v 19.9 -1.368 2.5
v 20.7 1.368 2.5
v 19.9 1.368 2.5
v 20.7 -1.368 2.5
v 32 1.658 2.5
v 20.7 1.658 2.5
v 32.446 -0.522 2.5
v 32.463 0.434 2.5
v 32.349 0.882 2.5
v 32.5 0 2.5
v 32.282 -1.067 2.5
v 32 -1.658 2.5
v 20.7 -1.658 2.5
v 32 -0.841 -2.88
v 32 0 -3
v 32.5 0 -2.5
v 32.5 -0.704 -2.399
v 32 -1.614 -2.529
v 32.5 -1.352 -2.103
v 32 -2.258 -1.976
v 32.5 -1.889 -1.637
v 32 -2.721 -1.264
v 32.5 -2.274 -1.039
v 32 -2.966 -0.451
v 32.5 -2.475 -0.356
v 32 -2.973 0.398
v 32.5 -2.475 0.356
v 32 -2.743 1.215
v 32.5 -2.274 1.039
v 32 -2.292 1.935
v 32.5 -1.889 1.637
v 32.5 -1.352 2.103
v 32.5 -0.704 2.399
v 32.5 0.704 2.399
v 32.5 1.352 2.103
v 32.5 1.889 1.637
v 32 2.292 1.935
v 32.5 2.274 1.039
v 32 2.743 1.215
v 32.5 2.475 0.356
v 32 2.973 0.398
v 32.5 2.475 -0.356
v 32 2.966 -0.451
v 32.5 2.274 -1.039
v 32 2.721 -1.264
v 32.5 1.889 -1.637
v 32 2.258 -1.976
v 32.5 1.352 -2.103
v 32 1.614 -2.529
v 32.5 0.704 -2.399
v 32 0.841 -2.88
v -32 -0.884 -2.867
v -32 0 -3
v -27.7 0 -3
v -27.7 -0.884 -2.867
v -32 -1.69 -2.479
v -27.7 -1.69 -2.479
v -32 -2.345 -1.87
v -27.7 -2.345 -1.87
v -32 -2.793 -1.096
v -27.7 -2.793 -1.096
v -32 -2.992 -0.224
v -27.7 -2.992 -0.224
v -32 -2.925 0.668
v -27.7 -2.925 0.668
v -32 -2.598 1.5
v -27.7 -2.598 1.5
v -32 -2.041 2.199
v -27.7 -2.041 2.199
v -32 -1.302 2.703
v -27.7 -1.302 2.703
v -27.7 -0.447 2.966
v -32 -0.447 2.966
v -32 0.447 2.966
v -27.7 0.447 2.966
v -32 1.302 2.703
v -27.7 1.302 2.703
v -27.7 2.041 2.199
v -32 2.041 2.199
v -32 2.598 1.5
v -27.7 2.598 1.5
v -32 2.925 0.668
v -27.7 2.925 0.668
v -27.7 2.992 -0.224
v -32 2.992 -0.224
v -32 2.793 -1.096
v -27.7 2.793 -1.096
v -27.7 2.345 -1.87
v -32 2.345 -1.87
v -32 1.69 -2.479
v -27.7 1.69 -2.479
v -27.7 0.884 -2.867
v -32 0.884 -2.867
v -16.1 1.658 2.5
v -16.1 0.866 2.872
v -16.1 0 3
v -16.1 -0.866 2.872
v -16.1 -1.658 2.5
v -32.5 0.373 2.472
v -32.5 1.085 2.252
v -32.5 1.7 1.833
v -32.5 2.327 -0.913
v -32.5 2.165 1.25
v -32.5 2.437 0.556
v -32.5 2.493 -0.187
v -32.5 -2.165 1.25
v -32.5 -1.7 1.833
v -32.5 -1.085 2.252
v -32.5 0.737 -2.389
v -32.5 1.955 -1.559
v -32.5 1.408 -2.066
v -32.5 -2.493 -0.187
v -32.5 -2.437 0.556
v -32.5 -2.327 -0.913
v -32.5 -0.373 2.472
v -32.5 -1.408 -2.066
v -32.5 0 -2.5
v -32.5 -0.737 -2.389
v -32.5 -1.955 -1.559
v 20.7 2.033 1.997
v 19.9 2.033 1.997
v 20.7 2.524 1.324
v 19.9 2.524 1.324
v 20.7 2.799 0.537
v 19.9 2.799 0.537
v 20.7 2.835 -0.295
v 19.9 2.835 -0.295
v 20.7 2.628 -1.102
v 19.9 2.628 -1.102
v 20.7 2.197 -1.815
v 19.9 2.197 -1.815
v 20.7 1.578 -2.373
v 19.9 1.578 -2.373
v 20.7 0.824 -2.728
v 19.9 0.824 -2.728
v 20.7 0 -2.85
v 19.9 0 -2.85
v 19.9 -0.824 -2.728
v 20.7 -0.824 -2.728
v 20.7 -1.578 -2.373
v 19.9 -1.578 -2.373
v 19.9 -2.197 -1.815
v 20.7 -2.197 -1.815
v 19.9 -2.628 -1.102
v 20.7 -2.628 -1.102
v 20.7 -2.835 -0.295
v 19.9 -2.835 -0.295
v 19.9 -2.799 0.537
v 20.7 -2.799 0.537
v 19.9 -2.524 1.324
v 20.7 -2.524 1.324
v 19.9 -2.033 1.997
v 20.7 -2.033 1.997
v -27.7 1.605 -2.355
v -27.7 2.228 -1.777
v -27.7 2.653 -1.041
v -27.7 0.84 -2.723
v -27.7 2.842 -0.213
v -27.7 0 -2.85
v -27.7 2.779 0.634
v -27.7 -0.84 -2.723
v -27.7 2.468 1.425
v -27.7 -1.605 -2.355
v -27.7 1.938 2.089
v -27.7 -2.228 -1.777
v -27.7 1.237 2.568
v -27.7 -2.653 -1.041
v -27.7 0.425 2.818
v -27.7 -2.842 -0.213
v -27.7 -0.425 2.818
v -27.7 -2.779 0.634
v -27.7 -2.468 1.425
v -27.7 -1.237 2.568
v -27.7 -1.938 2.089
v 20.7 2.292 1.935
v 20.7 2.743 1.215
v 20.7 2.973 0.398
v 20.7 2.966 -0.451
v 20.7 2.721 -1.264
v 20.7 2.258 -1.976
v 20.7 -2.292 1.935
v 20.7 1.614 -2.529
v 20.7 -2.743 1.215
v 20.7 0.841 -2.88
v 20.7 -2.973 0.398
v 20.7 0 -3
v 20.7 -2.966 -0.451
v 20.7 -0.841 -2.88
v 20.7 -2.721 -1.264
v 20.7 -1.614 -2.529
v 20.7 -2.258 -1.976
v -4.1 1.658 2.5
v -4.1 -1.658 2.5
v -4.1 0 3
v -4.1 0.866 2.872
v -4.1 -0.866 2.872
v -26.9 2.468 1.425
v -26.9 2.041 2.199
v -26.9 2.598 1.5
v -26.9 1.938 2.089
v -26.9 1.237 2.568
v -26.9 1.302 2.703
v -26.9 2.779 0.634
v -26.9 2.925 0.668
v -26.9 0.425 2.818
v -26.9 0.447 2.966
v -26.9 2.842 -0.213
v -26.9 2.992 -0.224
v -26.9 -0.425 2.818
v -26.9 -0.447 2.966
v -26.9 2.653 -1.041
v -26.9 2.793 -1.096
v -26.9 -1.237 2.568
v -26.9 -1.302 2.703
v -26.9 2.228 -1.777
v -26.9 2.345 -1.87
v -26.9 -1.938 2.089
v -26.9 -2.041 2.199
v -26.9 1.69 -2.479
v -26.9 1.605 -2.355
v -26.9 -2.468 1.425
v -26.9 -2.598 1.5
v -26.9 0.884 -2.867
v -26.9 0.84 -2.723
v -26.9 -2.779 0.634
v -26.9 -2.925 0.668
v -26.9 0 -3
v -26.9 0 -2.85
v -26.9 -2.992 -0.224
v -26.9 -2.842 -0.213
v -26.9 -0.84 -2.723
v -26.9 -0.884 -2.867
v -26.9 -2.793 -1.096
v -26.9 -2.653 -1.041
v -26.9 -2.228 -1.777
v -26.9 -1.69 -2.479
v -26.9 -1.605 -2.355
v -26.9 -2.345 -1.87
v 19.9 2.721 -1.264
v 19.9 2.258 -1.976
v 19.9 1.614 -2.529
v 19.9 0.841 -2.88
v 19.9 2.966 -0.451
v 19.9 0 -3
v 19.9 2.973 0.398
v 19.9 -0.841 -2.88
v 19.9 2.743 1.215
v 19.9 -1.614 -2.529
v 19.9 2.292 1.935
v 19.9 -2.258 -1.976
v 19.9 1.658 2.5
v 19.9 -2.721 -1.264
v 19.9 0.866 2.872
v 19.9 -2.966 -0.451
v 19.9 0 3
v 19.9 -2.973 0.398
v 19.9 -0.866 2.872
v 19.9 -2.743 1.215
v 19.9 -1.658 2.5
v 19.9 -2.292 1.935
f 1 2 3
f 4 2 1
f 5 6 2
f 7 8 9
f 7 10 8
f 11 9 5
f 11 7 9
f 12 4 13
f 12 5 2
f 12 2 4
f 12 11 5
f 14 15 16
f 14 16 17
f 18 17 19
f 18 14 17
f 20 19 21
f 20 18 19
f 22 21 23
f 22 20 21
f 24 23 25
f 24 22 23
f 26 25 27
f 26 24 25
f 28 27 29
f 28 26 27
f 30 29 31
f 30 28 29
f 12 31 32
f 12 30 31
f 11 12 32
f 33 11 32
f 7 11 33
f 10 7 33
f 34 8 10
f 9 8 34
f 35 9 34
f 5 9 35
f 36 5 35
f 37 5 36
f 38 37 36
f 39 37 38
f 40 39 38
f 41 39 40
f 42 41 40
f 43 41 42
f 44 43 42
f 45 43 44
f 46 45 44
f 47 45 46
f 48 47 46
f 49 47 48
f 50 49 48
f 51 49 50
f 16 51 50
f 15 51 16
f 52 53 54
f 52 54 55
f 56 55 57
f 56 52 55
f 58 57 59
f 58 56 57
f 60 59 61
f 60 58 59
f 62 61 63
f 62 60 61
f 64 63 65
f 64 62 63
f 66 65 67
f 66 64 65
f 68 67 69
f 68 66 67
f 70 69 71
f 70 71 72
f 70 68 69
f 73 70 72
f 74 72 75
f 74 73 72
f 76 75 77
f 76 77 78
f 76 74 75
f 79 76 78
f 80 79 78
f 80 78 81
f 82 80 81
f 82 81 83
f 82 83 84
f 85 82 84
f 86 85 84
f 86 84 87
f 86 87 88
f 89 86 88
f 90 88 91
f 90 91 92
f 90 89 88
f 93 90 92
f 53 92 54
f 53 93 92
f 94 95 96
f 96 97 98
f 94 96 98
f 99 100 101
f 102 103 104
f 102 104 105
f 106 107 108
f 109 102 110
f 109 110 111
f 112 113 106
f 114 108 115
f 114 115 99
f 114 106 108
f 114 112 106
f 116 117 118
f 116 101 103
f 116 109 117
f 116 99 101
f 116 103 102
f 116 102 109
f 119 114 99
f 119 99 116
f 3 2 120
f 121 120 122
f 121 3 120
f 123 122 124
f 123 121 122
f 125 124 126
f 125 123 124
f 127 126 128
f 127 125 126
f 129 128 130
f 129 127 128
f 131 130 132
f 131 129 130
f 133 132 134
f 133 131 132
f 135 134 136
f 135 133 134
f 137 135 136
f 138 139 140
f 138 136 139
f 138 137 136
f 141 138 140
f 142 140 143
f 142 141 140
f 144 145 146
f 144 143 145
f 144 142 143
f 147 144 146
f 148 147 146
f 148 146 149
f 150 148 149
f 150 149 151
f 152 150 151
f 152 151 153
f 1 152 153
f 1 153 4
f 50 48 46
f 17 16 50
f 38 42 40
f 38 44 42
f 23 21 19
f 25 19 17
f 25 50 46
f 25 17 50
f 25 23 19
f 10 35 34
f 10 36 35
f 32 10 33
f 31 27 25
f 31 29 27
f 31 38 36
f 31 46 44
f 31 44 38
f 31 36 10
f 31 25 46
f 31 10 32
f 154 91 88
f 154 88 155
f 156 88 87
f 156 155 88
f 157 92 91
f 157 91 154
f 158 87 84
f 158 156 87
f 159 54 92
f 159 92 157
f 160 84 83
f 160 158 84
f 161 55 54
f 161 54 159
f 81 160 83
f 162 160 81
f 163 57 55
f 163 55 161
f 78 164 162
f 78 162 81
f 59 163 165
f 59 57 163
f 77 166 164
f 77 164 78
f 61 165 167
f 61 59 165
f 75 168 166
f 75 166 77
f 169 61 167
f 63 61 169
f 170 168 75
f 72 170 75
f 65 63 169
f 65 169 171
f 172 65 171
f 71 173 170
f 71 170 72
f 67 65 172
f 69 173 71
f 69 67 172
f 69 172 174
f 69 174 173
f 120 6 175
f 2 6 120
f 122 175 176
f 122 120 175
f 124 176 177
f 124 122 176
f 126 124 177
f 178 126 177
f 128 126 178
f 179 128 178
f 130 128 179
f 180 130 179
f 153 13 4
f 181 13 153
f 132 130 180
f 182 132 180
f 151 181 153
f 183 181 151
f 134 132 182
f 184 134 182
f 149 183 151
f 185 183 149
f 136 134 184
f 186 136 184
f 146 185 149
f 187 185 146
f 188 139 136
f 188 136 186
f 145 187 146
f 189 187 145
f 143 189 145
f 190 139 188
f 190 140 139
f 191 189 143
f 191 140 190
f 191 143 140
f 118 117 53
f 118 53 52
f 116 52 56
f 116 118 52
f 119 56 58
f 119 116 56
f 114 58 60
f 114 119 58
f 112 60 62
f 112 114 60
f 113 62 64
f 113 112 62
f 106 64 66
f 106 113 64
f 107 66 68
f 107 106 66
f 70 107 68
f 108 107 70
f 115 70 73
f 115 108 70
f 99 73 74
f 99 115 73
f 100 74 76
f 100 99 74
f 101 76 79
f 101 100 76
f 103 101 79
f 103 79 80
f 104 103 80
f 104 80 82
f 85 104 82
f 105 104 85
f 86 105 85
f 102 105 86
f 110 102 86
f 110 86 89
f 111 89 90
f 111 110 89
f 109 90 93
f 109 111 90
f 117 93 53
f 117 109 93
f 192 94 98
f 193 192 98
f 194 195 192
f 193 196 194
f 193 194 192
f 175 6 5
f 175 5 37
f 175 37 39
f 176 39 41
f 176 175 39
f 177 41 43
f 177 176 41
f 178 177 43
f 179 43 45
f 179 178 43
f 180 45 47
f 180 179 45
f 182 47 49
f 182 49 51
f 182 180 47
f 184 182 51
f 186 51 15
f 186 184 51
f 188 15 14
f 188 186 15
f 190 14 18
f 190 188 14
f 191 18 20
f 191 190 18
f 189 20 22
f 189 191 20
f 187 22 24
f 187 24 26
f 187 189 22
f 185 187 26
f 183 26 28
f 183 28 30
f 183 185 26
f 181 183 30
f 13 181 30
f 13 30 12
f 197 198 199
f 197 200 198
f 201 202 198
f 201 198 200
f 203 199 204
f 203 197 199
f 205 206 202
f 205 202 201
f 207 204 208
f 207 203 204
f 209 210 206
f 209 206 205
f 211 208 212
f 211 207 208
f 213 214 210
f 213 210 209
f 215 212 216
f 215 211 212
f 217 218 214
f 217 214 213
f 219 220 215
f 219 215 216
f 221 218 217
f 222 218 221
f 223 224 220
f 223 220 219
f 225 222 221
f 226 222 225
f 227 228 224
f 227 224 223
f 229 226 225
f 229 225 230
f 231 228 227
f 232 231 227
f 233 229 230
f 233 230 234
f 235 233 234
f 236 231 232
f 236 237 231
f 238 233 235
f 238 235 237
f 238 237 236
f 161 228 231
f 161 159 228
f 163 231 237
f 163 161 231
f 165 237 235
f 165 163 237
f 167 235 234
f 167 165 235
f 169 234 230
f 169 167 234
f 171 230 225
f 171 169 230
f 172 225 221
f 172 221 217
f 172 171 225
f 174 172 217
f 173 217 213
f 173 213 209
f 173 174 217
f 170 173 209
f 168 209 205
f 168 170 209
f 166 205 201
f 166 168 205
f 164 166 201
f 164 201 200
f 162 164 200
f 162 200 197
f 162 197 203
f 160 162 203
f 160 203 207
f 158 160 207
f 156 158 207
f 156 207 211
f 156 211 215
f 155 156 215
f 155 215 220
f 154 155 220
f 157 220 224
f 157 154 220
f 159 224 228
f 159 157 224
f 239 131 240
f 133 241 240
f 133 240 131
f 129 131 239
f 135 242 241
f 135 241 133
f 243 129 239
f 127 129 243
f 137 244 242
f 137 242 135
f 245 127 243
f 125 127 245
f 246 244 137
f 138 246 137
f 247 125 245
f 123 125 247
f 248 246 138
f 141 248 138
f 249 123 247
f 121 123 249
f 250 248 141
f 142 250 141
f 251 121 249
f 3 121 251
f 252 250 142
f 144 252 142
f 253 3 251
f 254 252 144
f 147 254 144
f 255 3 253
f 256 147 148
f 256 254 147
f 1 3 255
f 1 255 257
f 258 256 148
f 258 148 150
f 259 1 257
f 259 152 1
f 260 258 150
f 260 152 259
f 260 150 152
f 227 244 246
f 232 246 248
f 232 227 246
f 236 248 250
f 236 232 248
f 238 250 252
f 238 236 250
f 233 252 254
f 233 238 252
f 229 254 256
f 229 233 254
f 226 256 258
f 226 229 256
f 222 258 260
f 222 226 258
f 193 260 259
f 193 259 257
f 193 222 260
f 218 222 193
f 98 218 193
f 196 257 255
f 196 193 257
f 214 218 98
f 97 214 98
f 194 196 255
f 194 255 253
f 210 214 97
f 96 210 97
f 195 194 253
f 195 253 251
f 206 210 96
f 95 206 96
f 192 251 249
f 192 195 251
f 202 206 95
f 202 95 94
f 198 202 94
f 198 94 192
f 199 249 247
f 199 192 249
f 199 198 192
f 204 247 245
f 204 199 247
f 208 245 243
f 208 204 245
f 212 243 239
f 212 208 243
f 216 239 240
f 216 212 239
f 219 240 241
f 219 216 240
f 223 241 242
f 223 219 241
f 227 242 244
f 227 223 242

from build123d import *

# Parameters (mm, degrees)
CHAFL_N1_SIZE         = 0.5
CORTAR_EXTRUIR1_REACH = 67.138
CORTAR_EXTRUIR2_START = -48.6
CORTAR_EXTRUIR2_DEPTH = 12


with BuildPart() as part:
    # Croquis1 → Revolución1 (revolve)
    with BuildSketch(Plane(origin=(0, 0, 0), x_dir=(-1, 0, 0), z_dir=(0, 1, 0)), mode=Mode.PRIVATE) as revoluci_n1_sk:
        Polygon((-32.5, 0), (-32.5, 3), (-20.7, 3), (-20.7, 2.85), (-19.9, 2.85), (-19.9, 3), (26.9, 3), (26.9, 2.85), (27.7, 2.85), (27.7, 3), (32.5, 3), (32.5, 0), align=None)
    revolve(revoluci_n1_sk.sketch.rotate(Axis((32.5, 0, 0), (-1, 0, 0)), 180), axis=Axis((32.5, 0, 0), (-1, 0, 0)))

    # Chaflán1
    chafl_n1_edges = [part.edges().sort_by_distance(p)[0] for p in [
        (32.5, 0, 3),
        (-32.5, 0, 3),
    ]]
    chamfer(chafl_n1_edges, length=CHAFL_N1_SIZE)

    # Cortar-Extruir1: up to this face of the body (flat: up to its plane)
    cortar_extruir1_end = Plane(part.part.faces().sort_by_distance((19.9, 0, 2.934852814))[0])
    # Croquis2 → Cortar-Extruir1 (cut, up to the picked face)
    with BuildSketch(Plane.YZ.offset(32.5), mode=Mode.PRIVATE) as cortar_extruir1_sk1:
        with BuildLine():
            Line((1.658312395, 2.5), (-1.658312395, 2.5))
            ThreePointArc((-1.658312395, 2.5), (0, 3), (1.658312395, 2.5))
        make_face()
    cortar_extruir1_tool1 = split(extrude(cortar_extruir1_sk1.sketch, amount=-CORTAR_EXTRUIR1_REACH, mode=Mode.PRIVATE), bisect_by=cortar_extruir1_end, keep=Keep.BOTH, mode=Mode.PRIVATE)
    add(cortar_extruir1_tool1.solids().sort_by(Axis((32.5, 0, 2.701501), (-1, 0, 0)))[0], mode=Mode.SUBTRACT)

    # Croquis2<2> → Cortar-Extruir2 (cut)
    with BuildSketch(Plane.YZ.offset(32.5).offset(CORTAR_EXTRUIR2_START)):
        with BuildLine():
            Line((1.658312395, 2.5), (-1.658312395, 2.5))
            ThreePointArc((-1.658312395, 2.5), (0, 3), (1.658312395, 2.5))
        make_face()
    extrude(amount=CORTAR_EXTRUIR2_DEPTH, mode=Mode.SUBTRACT)


solid = part.part
